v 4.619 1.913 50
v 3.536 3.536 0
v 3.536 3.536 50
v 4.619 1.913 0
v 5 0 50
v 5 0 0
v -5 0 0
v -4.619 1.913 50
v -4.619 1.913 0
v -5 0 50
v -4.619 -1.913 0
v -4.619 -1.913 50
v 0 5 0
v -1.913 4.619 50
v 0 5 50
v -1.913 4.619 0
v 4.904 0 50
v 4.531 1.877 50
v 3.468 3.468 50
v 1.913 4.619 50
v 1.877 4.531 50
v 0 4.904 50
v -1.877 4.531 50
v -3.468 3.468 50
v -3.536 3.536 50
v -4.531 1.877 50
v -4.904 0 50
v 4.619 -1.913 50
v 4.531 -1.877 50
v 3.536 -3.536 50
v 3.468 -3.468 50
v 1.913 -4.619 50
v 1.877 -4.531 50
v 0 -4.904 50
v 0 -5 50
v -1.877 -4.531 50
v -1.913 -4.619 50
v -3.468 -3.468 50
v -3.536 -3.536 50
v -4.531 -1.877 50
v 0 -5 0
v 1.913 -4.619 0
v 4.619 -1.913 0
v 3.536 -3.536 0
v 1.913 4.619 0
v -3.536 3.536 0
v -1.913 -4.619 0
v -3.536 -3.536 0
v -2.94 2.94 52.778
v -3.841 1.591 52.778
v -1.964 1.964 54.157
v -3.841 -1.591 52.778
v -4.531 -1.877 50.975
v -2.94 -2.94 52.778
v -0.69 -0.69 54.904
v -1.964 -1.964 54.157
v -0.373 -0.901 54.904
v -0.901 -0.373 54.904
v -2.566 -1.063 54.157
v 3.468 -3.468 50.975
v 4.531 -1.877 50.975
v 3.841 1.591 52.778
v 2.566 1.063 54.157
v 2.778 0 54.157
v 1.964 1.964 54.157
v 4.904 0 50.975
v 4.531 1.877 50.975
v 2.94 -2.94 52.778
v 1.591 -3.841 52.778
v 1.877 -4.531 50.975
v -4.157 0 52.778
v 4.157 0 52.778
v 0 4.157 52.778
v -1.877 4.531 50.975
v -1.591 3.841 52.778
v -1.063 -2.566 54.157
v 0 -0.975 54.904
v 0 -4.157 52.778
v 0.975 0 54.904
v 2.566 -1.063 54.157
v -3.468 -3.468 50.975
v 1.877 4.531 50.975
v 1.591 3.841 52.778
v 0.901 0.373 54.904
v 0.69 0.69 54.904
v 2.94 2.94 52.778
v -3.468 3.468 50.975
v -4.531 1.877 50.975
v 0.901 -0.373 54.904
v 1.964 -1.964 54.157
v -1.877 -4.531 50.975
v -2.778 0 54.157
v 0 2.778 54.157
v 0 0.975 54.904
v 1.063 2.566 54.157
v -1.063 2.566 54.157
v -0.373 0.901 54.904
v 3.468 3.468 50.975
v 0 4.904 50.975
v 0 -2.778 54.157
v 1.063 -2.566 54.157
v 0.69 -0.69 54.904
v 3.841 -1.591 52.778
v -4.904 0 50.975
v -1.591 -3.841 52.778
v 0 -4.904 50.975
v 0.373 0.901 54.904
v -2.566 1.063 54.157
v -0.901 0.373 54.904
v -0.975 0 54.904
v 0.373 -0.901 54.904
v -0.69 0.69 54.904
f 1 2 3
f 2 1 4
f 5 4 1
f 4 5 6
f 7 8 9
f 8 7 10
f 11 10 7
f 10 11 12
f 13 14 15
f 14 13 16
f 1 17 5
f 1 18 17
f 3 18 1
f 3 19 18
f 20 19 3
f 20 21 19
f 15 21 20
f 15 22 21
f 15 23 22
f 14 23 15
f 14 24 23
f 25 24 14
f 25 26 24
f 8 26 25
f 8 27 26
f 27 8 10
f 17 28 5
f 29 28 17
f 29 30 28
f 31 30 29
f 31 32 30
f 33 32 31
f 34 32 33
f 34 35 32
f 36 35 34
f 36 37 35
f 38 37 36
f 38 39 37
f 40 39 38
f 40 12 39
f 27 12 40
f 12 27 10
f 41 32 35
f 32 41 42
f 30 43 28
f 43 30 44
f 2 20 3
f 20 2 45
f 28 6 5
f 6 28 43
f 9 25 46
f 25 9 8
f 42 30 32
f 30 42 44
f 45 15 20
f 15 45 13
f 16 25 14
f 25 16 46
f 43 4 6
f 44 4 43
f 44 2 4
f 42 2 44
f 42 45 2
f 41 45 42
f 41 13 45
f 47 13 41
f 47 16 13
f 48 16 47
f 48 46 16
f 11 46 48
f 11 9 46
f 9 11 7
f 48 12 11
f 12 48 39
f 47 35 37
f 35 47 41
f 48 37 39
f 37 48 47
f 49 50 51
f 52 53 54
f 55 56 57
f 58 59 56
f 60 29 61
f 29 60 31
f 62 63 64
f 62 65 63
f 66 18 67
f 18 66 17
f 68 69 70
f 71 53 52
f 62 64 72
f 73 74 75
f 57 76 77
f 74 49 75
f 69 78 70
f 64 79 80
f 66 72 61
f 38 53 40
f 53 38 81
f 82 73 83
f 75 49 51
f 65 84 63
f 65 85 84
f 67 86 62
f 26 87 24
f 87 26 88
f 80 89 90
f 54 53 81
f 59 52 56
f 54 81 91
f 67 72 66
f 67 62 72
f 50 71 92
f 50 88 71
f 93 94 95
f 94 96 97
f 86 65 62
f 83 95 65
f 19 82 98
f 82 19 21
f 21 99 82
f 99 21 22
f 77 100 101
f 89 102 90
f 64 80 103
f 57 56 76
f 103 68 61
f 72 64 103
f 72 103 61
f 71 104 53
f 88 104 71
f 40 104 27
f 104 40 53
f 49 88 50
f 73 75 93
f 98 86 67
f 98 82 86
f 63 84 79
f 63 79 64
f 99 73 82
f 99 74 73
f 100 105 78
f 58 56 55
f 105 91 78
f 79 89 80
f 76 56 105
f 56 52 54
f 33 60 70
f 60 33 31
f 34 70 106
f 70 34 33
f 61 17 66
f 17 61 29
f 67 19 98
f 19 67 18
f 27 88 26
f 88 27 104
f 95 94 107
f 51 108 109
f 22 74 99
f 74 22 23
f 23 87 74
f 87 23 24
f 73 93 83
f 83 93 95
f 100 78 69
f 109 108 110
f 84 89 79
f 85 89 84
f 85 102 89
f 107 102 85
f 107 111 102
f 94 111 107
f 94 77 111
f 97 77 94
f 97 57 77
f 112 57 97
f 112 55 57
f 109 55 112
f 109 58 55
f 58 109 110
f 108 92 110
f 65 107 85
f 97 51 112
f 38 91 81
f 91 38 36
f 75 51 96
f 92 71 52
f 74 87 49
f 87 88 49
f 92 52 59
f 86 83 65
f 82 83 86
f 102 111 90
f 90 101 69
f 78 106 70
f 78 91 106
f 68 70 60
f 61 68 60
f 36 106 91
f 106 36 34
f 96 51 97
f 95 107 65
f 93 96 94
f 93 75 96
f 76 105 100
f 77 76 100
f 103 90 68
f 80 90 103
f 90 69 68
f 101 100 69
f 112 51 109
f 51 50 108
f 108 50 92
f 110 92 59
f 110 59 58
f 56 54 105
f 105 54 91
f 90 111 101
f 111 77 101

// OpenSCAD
// intersection() {
    // circle(25);
    // square(45, center=true);
// }

//linear_extrude(height=6, twist=360, slices=1000) //polygon([[0,0], [0,1], [1,0]]);

// sphere(5, $fn=100);

// $fn - pocet hran
// $fa - pocet hran relativne

module rec(cr=5, ch=50, bc=3, angle=60) {
    cylinder(r=cr, h=ch);
    translate([0,0,ch]) {
        sphere(r=cr)
        for(i=[0:bc-1]) {
            rotate([0,0,(360/bc)*i])
                rotate([angle,0,0])
                    cylinder(r=cr, h=ch);
        }
    }
}

rec();
